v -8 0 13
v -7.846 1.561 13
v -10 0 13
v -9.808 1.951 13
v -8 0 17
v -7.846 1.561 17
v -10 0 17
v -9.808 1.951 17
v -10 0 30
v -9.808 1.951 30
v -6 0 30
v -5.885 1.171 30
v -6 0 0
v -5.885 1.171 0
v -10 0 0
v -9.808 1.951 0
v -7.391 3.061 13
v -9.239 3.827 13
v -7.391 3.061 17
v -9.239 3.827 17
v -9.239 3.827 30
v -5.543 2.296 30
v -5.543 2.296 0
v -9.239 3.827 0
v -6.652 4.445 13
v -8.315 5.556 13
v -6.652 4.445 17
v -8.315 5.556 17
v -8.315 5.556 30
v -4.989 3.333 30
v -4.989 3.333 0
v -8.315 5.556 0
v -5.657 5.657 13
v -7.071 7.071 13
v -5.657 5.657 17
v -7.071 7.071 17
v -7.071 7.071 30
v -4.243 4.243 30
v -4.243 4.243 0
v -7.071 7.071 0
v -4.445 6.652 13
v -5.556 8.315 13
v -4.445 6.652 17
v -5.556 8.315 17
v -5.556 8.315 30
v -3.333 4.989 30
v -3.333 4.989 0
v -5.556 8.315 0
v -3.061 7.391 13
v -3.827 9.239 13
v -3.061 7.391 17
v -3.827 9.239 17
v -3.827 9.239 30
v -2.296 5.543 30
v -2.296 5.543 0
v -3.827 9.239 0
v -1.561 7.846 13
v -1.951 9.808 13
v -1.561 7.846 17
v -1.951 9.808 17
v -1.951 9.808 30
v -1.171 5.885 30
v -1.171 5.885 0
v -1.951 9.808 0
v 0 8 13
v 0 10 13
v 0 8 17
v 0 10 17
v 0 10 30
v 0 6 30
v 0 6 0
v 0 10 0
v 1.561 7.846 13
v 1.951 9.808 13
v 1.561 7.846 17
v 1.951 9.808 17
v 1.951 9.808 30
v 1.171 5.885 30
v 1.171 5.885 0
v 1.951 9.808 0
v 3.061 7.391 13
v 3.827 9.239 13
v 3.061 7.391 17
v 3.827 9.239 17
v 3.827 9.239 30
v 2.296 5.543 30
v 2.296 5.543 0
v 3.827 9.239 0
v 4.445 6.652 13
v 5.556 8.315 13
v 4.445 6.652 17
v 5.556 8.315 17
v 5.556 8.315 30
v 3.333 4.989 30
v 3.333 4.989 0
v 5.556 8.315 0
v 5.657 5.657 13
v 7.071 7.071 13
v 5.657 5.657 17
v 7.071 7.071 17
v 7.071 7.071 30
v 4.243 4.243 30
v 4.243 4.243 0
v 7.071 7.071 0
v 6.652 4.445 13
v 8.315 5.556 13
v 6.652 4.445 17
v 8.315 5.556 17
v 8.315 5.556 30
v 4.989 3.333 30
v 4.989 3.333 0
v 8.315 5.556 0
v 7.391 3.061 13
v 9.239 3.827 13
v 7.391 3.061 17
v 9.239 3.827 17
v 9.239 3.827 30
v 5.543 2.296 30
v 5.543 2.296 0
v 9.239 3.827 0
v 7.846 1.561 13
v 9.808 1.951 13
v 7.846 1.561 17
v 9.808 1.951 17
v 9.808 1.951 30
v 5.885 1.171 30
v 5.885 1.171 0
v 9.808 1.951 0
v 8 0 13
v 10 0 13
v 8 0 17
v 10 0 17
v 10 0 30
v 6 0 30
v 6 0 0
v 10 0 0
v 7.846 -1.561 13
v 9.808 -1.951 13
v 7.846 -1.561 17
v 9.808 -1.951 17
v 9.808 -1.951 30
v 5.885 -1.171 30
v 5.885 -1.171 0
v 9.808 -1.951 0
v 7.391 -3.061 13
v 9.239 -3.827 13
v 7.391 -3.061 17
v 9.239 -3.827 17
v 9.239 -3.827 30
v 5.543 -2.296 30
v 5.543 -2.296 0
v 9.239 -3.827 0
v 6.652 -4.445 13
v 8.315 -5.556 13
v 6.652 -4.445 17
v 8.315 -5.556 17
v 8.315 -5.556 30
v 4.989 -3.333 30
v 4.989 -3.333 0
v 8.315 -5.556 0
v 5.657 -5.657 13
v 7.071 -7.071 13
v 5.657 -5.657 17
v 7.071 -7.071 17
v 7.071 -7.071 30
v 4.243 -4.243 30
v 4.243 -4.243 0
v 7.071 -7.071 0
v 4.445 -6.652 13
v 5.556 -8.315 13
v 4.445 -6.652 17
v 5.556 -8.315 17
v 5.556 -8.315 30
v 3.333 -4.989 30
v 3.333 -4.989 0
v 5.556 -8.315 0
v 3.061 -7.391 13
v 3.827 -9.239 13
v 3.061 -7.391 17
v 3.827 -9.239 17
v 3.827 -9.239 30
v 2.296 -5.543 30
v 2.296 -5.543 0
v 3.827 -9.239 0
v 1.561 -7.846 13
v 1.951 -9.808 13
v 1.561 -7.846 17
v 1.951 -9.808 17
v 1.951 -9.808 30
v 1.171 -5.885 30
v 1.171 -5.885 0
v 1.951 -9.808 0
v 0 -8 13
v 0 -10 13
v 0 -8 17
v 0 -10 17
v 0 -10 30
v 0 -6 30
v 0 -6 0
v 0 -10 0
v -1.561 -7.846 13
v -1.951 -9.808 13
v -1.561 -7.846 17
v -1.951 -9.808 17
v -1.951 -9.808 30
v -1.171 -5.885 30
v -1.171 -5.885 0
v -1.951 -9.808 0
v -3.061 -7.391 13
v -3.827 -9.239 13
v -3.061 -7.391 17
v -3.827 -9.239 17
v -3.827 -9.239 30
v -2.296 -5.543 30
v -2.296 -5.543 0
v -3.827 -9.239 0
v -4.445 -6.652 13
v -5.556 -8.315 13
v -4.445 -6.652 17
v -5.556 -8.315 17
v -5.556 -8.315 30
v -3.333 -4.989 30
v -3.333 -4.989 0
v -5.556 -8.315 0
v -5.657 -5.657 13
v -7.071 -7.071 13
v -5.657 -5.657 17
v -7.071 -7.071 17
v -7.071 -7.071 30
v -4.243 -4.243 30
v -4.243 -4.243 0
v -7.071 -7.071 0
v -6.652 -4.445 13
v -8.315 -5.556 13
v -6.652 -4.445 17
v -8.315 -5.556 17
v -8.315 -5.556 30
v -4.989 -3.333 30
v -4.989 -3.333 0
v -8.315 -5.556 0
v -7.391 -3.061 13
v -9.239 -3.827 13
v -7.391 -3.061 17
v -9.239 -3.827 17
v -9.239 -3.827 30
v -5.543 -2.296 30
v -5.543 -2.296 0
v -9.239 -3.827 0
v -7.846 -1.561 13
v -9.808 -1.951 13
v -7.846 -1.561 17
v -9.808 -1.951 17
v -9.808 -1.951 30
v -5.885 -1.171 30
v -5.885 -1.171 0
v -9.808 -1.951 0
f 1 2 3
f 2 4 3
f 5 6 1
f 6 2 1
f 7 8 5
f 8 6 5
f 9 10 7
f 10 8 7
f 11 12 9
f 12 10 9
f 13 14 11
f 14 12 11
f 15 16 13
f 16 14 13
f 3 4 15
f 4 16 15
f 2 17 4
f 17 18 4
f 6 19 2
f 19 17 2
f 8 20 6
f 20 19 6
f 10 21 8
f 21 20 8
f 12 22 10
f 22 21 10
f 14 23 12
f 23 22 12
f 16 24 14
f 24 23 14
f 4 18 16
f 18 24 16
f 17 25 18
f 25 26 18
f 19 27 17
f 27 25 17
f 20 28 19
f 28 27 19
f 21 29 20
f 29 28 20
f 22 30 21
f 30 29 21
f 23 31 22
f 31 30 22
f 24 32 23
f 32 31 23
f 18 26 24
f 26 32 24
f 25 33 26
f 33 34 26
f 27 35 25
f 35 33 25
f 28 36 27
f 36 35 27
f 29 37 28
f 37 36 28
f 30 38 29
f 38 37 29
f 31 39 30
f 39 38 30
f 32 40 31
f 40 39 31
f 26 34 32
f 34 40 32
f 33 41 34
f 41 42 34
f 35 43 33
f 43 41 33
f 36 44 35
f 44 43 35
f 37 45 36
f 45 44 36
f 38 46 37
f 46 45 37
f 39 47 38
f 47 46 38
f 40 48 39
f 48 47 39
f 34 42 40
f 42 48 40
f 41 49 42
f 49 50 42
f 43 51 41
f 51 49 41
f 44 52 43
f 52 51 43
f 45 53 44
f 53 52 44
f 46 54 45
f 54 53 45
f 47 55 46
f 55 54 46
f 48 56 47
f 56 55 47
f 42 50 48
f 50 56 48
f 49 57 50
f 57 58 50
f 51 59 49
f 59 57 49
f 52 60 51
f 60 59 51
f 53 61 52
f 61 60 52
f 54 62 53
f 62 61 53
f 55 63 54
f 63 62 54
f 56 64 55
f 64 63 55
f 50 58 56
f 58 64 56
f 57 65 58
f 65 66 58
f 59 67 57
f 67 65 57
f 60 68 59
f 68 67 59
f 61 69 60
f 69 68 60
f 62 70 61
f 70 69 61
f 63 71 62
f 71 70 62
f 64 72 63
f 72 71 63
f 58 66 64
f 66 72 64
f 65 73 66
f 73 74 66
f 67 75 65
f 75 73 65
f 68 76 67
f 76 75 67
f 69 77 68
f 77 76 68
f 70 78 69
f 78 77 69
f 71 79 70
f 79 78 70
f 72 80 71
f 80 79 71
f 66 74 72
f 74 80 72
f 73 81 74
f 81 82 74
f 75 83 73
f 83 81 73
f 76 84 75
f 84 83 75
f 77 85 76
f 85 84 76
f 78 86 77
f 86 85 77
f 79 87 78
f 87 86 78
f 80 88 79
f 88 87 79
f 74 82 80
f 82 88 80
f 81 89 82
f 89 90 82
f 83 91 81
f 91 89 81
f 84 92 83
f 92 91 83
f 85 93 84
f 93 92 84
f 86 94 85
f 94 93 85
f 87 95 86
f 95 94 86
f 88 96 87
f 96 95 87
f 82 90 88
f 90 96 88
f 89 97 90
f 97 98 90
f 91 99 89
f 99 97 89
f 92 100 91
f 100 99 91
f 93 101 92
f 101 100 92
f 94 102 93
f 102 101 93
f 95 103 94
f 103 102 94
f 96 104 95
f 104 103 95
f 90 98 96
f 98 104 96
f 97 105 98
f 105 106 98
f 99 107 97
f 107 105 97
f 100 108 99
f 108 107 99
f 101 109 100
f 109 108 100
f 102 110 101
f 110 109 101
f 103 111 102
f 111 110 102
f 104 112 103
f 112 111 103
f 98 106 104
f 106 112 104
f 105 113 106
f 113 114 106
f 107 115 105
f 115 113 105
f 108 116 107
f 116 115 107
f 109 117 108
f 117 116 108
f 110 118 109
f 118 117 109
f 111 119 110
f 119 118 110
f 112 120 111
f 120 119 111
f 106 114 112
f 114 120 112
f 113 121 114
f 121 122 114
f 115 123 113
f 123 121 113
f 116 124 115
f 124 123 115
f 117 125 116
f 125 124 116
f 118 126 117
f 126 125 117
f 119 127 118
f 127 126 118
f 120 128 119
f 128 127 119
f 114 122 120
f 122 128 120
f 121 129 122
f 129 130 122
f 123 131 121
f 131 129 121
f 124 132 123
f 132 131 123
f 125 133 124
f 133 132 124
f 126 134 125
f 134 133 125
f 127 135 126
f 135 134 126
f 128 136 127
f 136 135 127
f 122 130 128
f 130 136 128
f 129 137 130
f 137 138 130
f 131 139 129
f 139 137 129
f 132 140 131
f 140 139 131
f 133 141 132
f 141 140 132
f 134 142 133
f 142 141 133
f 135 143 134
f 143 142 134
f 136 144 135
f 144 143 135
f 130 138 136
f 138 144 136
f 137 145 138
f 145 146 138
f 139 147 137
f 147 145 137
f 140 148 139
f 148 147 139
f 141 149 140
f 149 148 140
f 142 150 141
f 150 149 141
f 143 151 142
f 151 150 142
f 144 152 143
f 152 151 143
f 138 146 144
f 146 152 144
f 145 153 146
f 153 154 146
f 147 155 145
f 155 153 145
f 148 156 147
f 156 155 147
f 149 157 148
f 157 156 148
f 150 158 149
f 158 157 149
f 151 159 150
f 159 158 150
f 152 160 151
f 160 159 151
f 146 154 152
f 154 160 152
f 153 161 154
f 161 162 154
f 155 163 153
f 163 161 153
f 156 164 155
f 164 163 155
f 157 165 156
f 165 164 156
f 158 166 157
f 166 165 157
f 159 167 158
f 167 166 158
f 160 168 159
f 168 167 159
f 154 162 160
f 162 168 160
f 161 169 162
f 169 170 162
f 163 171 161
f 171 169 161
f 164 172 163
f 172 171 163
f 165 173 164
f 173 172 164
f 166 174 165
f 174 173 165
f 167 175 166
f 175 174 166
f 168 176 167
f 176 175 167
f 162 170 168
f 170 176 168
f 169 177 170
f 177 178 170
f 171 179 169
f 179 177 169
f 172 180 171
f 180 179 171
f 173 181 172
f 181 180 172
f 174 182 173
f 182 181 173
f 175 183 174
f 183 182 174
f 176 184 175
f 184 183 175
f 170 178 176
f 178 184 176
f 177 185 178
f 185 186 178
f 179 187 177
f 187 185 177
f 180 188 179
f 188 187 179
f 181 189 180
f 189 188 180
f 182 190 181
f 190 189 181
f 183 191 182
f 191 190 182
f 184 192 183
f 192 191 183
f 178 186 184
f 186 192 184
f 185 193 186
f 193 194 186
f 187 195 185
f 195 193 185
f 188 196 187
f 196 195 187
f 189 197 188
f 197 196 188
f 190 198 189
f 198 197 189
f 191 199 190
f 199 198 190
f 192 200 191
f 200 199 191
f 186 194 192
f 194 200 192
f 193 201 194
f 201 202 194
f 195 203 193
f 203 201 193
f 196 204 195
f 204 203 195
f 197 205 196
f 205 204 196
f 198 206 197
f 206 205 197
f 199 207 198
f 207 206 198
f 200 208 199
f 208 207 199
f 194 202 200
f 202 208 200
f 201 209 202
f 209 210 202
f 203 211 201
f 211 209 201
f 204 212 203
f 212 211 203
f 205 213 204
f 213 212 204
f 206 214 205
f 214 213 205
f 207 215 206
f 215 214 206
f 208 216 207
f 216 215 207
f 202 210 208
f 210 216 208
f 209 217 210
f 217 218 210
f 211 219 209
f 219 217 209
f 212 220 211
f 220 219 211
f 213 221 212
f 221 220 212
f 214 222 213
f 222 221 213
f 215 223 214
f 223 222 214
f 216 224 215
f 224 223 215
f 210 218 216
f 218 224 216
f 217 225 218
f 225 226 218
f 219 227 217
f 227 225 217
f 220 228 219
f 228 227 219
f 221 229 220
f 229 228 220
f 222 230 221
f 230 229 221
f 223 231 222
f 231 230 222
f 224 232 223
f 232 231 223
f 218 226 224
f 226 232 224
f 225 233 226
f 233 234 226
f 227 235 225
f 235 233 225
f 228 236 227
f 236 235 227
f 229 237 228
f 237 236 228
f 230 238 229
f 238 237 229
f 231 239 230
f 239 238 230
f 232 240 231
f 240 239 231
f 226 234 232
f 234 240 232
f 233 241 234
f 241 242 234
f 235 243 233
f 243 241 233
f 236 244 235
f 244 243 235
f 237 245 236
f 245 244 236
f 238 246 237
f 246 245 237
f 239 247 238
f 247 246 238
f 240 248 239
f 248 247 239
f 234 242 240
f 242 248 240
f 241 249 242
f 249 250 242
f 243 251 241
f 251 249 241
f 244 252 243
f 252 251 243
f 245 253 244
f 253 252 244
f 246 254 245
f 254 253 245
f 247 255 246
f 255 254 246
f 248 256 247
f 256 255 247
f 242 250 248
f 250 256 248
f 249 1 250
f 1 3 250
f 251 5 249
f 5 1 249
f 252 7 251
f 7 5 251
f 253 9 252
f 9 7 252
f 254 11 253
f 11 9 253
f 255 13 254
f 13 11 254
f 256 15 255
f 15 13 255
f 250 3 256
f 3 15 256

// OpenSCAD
$fn = 32;

// ----------------------------------------------------------------------
// Grooved revolve: stepped, bore R6
// ----------------------------------------------------------------------

// --- parameters (mm) ---
bore_r = 6;               // bore radius
outer_r = 10;             // outer radius of the body
total_h = 30;             // overall height, Z
wall = 4;                 // radial wall thickness
groove_w = 4;             // groove width
groove_d = 2;             // groove depth
grooves = 1;              // number of outer grooves

bbox_x = 2 * outer_r;  // full diameter
bore_d = 2 * bore_r;  // bore diameter
body_d = 2 * outer_r;  // body diameter
revolve_angle = 360;  // full turn around the Z axis

profile = [[6, 0], [10, 0], [10, 13], [8, 13], [8, 17], [10, 17], [10, 30], [6, 30]];  // primary outline, 8 points, counter clockwise

// --- the one profile operation ---
rotate_extrude(angle = revolve_angle) polygon(points = profile);
